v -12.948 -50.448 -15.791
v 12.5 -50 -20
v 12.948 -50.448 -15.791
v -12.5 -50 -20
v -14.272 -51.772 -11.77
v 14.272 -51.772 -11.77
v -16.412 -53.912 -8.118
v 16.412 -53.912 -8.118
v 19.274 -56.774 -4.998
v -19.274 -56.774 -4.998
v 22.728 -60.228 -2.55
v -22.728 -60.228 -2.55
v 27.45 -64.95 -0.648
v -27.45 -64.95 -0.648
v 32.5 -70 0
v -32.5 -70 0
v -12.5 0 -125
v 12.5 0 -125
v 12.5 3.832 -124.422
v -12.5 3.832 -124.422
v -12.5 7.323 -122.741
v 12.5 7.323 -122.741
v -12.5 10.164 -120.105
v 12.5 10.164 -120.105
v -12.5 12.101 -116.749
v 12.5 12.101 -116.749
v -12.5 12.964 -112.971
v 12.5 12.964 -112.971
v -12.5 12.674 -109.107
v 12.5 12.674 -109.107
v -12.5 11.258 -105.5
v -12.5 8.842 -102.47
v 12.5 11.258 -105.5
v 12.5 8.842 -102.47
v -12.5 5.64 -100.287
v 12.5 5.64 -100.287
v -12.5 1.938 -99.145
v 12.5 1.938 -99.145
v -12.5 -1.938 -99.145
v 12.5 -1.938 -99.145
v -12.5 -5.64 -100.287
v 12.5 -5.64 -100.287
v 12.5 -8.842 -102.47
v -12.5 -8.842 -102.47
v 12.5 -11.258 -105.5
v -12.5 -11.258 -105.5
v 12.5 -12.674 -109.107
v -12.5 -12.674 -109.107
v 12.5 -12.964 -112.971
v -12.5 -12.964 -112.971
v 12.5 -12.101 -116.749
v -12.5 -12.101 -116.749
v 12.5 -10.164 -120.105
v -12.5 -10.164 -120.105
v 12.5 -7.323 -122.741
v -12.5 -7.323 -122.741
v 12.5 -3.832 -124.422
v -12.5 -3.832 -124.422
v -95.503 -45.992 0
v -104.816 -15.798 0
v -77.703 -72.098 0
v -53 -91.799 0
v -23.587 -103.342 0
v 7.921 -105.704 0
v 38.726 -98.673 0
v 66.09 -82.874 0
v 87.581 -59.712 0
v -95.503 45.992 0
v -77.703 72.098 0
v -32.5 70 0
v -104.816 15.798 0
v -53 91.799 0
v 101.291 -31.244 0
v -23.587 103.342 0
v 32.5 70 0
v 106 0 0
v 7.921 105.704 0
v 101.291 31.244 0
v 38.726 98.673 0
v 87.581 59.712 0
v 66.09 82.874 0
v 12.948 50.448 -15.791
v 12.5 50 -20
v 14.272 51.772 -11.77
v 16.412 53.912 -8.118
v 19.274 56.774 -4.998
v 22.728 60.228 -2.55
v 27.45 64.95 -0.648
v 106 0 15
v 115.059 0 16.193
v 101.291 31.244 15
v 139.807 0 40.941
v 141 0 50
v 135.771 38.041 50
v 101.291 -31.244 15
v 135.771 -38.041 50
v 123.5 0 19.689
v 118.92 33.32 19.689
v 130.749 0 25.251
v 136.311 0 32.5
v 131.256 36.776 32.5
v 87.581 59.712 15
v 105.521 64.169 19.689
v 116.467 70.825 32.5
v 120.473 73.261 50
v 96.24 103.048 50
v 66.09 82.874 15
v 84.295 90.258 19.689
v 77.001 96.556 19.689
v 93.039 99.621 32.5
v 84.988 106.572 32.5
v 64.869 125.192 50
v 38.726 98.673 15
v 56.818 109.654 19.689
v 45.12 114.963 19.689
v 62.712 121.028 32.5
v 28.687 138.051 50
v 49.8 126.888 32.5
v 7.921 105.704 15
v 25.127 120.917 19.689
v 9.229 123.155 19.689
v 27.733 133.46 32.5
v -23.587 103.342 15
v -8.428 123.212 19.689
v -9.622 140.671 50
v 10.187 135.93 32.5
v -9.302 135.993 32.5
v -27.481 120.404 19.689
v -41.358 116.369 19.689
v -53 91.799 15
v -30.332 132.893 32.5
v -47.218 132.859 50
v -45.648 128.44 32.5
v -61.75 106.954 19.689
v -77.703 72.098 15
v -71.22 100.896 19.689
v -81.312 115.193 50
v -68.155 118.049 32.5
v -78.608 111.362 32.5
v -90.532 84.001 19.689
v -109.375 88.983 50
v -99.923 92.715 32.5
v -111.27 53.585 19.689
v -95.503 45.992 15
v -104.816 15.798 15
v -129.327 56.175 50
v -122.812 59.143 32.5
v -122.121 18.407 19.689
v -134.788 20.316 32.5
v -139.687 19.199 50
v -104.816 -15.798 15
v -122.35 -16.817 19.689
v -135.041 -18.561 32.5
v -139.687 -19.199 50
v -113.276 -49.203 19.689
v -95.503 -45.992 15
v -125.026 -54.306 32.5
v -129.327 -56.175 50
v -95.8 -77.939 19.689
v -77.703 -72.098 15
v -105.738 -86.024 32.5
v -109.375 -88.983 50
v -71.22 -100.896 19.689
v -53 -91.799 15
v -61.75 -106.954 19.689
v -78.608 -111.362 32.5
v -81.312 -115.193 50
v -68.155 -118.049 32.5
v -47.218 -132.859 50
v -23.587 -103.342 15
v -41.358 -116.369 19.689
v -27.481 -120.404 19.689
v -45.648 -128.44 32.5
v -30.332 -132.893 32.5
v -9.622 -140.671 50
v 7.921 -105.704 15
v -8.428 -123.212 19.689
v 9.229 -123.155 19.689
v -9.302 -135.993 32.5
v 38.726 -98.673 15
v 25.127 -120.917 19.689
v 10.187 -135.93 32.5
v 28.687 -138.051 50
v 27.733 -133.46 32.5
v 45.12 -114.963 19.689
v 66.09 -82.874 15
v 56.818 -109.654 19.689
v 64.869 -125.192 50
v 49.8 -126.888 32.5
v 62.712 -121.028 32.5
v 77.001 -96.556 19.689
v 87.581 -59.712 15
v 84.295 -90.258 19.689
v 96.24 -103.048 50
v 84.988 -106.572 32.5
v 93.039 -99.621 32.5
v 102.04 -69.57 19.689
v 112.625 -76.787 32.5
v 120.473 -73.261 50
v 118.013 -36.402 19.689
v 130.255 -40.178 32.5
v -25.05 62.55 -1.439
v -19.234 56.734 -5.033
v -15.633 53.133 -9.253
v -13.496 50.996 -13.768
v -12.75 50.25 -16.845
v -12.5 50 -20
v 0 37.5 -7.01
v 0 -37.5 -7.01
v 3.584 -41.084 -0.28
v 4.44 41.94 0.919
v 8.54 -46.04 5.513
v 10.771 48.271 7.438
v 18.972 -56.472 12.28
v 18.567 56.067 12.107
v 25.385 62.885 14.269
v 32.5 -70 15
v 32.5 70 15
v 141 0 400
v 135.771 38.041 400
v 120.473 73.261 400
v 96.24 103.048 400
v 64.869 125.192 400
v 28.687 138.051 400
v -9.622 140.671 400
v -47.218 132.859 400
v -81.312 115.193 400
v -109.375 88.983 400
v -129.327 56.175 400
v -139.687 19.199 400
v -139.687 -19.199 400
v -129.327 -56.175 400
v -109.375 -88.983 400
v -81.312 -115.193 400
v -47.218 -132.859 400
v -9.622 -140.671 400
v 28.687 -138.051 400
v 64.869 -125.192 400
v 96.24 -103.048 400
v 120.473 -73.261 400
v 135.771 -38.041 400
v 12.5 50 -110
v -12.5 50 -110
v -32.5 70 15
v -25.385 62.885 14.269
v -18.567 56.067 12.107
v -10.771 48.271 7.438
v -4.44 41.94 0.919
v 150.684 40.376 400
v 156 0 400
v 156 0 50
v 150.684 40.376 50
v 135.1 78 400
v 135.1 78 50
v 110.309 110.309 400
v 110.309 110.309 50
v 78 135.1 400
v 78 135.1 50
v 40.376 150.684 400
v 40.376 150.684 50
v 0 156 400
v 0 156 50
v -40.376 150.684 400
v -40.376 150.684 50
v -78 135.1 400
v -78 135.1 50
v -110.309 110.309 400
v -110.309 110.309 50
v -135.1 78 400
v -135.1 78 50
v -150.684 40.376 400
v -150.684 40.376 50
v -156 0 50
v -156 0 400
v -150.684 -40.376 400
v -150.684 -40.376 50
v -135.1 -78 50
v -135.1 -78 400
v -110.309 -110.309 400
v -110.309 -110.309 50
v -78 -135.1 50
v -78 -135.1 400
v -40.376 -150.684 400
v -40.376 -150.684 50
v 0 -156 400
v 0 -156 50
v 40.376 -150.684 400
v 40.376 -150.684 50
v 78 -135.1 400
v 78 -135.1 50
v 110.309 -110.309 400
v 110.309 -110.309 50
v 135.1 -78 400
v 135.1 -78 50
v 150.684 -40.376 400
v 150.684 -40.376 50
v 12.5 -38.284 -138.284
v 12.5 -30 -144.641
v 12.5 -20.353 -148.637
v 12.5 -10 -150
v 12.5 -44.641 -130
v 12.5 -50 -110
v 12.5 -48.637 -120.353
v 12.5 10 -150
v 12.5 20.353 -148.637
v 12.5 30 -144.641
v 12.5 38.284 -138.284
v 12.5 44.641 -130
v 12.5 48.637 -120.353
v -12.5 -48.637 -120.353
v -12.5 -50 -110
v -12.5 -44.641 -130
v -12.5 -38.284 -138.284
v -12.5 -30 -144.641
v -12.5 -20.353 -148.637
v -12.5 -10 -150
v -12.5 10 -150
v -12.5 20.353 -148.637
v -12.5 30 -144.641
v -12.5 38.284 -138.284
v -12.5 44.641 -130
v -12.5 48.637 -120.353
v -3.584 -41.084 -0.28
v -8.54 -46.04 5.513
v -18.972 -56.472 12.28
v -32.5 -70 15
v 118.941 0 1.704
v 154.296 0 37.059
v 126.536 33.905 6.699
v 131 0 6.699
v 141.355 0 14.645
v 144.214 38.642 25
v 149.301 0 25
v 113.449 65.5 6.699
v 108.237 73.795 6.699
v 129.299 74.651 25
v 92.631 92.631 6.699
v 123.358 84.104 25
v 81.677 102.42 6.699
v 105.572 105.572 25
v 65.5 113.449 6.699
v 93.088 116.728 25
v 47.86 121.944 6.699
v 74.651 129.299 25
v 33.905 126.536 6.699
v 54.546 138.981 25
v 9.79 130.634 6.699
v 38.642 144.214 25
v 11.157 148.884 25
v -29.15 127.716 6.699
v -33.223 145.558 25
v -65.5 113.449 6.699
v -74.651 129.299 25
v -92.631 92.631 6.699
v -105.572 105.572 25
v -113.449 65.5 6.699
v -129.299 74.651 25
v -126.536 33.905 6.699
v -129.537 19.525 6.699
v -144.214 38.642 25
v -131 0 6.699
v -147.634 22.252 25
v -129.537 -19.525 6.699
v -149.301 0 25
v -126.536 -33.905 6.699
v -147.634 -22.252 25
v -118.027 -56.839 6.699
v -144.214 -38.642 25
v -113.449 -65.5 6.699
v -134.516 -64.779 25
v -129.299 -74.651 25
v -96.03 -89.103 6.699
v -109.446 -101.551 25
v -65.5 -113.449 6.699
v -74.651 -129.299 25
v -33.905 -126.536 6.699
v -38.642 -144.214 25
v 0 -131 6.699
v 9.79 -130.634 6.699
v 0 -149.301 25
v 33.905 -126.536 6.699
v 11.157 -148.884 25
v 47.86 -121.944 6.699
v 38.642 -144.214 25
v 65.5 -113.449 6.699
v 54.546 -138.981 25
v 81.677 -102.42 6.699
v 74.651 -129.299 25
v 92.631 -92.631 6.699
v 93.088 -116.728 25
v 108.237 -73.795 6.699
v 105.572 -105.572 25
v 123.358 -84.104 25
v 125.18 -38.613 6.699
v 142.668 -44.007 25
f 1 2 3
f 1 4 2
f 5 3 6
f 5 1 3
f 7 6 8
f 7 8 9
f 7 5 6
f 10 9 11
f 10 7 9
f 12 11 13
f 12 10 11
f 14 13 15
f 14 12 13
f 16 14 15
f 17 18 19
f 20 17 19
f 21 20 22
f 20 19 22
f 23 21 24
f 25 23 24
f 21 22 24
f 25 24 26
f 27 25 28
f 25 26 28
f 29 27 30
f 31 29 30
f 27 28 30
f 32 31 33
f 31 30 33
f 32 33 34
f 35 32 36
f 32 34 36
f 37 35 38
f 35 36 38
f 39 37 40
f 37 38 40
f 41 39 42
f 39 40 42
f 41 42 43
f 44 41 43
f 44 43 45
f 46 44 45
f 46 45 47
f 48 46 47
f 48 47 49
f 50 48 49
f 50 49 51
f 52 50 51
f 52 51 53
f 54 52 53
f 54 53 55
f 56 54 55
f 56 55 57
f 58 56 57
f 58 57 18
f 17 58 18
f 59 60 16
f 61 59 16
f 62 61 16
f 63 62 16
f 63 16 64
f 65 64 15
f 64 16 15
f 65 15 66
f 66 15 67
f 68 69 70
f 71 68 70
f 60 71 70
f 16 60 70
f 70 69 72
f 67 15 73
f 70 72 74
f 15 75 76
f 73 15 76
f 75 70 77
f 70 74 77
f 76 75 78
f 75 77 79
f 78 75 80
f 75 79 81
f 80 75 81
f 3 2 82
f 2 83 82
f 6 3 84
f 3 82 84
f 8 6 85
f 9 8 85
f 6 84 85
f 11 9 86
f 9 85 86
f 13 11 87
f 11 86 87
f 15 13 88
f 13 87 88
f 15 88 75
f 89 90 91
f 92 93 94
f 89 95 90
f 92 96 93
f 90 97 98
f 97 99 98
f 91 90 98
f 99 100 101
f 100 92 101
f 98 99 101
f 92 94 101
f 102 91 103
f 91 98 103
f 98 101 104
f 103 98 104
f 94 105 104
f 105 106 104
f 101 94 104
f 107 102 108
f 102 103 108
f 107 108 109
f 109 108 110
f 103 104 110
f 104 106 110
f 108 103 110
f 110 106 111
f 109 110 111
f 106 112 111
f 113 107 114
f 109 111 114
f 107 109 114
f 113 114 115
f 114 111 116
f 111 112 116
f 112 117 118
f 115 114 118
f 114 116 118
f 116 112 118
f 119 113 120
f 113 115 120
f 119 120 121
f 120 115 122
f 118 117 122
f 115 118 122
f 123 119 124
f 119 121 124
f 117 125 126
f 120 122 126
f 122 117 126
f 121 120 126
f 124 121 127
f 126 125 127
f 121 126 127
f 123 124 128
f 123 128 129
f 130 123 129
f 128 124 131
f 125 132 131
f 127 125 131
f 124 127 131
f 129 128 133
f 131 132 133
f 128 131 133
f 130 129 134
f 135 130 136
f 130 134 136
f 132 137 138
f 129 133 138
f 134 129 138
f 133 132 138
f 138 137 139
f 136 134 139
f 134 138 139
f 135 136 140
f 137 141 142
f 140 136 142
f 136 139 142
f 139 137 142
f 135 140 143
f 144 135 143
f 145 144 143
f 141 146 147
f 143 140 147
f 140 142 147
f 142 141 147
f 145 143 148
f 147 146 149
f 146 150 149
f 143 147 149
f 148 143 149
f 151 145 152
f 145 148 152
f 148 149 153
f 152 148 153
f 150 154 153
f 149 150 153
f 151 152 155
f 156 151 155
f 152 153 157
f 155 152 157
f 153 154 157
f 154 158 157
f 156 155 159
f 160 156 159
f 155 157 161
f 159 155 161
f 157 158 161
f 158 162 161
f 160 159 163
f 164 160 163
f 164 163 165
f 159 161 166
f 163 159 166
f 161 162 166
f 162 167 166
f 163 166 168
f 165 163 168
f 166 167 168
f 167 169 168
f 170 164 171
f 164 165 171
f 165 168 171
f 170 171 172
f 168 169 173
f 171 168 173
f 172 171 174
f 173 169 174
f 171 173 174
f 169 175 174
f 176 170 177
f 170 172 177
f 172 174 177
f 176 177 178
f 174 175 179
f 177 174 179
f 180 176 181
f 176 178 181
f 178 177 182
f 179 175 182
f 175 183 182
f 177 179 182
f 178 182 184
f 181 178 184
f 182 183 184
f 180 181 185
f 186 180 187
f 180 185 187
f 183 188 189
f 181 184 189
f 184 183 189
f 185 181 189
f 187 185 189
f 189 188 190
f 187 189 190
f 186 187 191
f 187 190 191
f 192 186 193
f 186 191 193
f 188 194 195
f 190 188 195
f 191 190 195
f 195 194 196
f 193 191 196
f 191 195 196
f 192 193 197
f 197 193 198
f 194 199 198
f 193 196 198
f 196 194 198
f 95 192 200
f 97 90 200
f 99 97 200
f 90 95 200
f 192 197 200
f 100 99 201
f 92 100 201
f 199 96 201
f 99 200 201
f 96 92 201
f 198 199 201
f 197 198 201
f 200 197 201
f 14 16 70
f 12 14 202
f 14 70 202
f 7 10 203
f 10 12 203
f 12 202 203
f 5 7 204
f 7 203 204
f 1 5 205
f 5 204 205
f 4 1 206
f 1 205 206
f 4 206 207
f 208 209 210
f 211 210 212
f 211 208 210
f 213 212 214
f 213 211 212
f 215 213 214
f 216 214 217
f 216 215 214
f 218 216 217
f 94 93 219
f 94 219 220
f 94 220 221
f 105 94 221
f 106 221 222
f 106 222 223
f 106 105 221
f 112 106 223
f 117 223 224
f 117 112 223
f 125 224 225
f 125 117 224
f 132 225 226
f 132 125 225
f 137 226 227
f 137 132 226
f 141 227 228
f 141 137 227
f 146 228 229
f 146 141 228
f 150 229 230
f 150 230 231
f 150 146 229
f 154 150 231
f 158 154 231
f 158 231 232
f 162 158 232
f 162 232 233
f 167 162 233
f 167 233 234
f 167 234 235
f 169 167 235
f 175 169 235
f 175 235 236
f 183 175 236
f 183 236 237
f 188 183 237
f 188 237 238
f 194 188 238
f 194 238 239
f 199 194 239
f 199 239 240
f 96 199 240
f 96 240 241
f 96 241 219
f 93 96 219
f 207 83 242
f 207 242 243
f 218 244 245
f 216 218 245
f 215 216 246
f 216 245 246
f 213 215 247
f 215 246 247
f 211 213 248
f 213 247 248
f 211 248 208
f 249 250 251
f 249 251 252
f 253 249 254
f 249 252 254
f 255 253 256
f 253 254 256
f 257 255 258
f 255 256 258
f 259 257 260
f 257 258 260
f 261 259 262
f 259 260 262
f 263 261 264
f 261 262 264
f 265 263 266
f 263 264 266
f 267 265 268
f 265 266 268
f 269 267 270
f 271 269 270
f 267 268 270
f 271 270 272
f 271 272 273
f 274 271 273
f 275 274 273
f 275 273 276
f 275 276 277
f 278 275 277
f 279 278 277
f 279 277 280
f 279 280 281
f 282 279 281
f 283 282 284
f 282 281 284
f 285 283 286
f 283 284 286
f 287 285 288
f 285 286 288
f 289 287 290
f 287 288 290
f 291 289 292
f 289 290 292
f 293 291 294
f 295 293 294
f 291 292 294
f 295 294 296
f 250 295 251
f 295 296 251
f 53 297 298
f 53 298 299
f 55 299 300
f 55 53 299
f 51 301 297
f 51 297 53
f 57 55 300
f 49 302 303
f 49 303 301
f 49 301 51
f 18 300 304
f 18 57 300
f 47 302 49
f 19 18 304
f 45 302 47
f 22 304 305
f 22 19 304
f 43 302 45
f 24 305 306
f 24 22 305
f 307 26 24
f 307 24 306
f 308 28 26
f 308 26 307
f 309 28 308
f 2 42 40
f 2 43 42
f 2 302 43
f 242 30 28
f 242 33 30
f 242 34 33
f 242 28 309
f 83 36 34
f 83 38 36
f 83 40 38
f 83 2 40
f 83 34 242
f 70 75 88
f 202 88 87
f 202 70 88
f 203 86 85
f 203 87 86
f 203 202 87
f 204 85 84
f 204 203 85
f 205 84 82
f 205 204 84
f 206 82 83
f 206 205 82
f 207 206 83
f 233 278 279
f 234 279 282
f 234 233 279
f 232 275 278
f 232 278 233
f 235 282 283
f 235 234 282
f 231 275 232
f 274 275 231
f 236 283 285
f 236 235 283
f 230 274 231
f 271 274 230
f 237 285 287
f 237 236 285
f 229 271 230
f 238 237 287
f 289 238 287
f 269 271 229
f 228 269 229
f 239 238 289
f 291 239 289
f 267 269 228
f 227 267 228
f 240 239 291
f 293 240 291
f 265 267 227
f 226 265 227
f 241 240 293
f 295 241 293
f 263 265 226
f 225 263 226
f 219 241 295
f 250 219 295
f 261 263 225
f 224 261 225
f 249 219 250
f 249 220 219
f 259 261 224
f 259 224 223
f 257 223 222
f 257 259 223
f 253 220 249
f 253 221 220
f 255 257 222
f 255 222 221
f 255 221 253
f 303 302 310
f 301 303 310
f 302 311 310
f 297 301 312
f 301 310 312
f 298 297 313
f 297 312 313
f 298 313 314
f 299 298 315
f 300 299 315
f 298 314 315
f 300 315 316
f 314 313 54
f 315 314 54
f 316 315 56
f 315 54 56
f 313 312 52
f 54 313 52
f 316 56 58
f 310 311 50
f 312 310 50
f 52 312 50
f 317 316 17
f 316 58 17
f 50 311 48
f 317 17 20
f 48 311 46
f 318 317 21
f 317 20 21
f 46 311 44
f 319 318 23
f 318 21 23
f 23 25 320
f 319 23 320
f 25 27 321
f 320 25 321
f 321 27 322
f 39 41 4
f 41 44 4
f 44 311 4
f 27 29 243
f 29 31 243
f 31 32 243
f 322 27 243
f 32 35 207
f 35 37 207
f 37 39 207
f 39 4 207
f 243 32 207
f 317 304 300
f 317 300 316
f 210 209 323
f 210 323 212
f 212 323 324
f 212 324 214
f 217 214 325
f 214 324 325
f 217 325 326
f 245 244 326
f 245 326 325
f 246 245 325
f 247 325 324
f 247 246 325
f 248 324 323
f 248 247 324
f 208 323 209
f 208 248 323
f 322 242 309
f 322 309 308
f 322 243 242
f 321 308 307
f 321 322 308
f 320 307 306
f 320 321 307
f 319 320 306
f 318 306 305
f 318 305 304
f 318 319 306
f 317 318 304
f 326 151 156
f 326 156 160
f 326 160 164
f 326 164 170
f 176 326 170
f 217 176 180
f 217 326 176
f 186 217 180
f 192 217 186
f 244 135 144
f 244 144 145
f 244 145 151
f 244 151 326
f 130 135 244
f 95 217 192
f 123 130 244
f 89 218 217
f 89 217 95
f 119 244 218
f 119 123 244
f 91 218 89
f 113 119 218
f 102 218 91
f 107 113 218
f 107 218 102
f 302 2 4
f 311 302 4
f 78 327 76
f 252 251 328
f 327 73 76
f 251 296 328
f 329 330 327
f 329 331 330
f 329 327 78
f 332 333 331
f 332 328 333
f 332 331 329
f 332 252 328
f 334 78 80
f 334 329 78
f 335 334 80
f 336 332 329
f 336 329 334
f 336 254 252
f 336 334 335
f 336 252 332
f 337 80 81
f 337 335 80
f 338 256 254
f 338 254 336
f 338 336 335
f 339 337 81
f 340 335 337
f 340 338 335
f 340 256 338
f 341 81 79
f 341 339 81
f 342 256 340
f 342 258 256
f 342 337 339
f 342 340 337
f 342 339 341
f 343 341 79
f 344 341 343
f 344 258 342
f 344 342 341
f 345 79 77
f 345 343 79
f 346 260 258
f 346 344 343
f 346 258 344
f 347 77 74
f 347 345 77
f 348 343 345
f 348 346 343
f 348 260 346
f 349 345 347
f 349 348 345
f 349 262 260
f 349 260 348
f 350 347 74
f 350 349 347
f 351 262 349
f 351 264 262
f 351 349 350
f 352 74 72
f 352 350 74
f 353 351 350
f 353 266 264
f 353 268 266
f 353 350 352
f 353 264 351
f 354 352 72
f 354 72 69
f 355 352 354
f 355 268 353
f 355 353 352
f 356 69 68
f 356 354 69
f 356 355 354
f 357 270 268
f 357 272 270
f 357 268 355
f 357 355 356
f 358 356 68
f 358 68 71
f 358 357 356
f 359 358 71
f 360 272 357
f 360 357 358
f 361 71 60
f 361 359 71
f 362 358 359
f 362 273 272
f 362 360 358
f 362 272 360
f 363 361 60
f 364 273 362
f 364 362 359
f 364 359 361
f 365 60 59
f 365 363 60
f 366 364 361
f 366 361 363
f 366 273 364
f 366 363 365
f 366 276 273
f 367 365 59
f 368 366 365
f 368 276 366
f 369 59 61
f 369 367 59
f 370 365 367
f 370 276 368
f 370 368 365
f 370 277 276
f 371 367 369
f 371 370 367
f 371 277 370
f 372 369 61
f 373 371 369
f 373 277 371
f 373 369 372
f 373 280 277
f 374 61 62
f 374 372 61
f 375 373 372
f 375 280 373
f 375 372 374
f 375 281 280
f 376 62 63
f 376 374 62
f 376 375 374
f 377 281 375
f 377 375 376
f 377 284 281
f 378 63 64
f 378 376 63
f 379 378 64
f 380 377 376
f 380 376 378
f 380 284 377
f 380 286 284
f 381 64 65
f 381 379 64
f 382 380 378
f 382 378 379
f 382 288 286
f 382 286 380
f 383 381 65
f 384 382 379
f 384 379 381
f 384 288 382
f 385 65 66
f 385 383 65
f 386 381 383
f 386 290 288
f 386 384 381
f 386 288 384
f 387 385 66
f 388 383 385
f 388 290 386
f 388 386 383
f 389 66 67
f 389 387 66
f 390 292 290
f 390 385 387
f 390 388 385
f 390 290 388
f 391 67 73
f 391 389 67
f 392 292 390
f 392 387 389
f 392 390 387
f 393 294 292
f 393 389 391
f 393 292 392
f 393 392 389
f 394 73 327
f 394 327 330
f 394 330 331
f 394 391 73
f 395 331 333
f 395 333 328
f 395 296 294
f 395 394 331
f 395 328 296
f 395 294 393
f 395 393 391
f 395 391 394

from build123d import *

# Parameters (mm, degrees)
SKETCH1_R           = 156
BOSS_EXTRUDE1_DEPTH = 400
SKETCH2_W           = 25
SKETCH2_H           = 100
BOSS_EXTRUDE2_DEPTH = 150
SKETCH3_R           = 13
CUT_EXTRUDE1_DEPTH  = 462.224728305
FILLET1_R           = 40
FILLET3_R           = 20
FILLET4_R           = 50
SHELL1_T            = -15


with BuildPart() as part:
    # Sketch1 → Boss-Extrude1 (new body)
    with BuildSketch(Plane.XY):
        Circle(SKETCH1_R)
    extrude(amount=BOSS_EXTRUDE1_DEPTH)

    # Sketch2 → Boss-Extrude2 (add)
    with BuildSketch(Plane(origin=(0, 0, 0), x_dir=(-1, 0, 0), z_dir=(0, 0, -1))):
        Rectangle(SKETCH2_W, SKETCH2_H)
    extrude(amount=BOSS_EXTRUDE2_DEPTH)

    # Sketch3 → Cut-Extrude1 (cut, through all)
    with BuildSketch(Plane(origin=(12.5, 0, 0), x_dir=(0, 0, -1), z_dir=(1, 0, 0))):
        with Locations((112, 0)):
            Circle(SKETCH3_R)
    extrude(amount=-CUT_EXTRUDE1_DEPTH, mode=Mode.SUBTRACT)

    # Fillet1
    fillet1_edges = [part.edges().sort_by_distance(p)[0] for p in [
        (0, 50, -150),
        (0, -50, -150),
    ]]
    fillet(fillet1_edges, radius=FILLET1_R)

    # Fillet3
    fillet3_edges = [part.edges().sort_by_distance(p)[0] for p in [
        (12.5, 0, 0),
        (0, -50, 0),
        (-12.5, 0, 0),
        (0, 50, 0),
    ]]
    fillet(fillet3_edges, radius=FILLET3_R)

    # Fillet4
    fillet4_edges = [part.edges().sort_by_distance(p)[0] for p in [
        (-156, 0, 0),
    ]]
    fillet(fillet4_edges, radius=FILLET4_R)

    # Shell1
    shell1_openings = [part.faces().sort_by_distance(p)[0] for p in [
        (0, 0, 400),
    ]]
    offset(amount=SHELL1_T, openings=shell1_openings)


solid = part.part
